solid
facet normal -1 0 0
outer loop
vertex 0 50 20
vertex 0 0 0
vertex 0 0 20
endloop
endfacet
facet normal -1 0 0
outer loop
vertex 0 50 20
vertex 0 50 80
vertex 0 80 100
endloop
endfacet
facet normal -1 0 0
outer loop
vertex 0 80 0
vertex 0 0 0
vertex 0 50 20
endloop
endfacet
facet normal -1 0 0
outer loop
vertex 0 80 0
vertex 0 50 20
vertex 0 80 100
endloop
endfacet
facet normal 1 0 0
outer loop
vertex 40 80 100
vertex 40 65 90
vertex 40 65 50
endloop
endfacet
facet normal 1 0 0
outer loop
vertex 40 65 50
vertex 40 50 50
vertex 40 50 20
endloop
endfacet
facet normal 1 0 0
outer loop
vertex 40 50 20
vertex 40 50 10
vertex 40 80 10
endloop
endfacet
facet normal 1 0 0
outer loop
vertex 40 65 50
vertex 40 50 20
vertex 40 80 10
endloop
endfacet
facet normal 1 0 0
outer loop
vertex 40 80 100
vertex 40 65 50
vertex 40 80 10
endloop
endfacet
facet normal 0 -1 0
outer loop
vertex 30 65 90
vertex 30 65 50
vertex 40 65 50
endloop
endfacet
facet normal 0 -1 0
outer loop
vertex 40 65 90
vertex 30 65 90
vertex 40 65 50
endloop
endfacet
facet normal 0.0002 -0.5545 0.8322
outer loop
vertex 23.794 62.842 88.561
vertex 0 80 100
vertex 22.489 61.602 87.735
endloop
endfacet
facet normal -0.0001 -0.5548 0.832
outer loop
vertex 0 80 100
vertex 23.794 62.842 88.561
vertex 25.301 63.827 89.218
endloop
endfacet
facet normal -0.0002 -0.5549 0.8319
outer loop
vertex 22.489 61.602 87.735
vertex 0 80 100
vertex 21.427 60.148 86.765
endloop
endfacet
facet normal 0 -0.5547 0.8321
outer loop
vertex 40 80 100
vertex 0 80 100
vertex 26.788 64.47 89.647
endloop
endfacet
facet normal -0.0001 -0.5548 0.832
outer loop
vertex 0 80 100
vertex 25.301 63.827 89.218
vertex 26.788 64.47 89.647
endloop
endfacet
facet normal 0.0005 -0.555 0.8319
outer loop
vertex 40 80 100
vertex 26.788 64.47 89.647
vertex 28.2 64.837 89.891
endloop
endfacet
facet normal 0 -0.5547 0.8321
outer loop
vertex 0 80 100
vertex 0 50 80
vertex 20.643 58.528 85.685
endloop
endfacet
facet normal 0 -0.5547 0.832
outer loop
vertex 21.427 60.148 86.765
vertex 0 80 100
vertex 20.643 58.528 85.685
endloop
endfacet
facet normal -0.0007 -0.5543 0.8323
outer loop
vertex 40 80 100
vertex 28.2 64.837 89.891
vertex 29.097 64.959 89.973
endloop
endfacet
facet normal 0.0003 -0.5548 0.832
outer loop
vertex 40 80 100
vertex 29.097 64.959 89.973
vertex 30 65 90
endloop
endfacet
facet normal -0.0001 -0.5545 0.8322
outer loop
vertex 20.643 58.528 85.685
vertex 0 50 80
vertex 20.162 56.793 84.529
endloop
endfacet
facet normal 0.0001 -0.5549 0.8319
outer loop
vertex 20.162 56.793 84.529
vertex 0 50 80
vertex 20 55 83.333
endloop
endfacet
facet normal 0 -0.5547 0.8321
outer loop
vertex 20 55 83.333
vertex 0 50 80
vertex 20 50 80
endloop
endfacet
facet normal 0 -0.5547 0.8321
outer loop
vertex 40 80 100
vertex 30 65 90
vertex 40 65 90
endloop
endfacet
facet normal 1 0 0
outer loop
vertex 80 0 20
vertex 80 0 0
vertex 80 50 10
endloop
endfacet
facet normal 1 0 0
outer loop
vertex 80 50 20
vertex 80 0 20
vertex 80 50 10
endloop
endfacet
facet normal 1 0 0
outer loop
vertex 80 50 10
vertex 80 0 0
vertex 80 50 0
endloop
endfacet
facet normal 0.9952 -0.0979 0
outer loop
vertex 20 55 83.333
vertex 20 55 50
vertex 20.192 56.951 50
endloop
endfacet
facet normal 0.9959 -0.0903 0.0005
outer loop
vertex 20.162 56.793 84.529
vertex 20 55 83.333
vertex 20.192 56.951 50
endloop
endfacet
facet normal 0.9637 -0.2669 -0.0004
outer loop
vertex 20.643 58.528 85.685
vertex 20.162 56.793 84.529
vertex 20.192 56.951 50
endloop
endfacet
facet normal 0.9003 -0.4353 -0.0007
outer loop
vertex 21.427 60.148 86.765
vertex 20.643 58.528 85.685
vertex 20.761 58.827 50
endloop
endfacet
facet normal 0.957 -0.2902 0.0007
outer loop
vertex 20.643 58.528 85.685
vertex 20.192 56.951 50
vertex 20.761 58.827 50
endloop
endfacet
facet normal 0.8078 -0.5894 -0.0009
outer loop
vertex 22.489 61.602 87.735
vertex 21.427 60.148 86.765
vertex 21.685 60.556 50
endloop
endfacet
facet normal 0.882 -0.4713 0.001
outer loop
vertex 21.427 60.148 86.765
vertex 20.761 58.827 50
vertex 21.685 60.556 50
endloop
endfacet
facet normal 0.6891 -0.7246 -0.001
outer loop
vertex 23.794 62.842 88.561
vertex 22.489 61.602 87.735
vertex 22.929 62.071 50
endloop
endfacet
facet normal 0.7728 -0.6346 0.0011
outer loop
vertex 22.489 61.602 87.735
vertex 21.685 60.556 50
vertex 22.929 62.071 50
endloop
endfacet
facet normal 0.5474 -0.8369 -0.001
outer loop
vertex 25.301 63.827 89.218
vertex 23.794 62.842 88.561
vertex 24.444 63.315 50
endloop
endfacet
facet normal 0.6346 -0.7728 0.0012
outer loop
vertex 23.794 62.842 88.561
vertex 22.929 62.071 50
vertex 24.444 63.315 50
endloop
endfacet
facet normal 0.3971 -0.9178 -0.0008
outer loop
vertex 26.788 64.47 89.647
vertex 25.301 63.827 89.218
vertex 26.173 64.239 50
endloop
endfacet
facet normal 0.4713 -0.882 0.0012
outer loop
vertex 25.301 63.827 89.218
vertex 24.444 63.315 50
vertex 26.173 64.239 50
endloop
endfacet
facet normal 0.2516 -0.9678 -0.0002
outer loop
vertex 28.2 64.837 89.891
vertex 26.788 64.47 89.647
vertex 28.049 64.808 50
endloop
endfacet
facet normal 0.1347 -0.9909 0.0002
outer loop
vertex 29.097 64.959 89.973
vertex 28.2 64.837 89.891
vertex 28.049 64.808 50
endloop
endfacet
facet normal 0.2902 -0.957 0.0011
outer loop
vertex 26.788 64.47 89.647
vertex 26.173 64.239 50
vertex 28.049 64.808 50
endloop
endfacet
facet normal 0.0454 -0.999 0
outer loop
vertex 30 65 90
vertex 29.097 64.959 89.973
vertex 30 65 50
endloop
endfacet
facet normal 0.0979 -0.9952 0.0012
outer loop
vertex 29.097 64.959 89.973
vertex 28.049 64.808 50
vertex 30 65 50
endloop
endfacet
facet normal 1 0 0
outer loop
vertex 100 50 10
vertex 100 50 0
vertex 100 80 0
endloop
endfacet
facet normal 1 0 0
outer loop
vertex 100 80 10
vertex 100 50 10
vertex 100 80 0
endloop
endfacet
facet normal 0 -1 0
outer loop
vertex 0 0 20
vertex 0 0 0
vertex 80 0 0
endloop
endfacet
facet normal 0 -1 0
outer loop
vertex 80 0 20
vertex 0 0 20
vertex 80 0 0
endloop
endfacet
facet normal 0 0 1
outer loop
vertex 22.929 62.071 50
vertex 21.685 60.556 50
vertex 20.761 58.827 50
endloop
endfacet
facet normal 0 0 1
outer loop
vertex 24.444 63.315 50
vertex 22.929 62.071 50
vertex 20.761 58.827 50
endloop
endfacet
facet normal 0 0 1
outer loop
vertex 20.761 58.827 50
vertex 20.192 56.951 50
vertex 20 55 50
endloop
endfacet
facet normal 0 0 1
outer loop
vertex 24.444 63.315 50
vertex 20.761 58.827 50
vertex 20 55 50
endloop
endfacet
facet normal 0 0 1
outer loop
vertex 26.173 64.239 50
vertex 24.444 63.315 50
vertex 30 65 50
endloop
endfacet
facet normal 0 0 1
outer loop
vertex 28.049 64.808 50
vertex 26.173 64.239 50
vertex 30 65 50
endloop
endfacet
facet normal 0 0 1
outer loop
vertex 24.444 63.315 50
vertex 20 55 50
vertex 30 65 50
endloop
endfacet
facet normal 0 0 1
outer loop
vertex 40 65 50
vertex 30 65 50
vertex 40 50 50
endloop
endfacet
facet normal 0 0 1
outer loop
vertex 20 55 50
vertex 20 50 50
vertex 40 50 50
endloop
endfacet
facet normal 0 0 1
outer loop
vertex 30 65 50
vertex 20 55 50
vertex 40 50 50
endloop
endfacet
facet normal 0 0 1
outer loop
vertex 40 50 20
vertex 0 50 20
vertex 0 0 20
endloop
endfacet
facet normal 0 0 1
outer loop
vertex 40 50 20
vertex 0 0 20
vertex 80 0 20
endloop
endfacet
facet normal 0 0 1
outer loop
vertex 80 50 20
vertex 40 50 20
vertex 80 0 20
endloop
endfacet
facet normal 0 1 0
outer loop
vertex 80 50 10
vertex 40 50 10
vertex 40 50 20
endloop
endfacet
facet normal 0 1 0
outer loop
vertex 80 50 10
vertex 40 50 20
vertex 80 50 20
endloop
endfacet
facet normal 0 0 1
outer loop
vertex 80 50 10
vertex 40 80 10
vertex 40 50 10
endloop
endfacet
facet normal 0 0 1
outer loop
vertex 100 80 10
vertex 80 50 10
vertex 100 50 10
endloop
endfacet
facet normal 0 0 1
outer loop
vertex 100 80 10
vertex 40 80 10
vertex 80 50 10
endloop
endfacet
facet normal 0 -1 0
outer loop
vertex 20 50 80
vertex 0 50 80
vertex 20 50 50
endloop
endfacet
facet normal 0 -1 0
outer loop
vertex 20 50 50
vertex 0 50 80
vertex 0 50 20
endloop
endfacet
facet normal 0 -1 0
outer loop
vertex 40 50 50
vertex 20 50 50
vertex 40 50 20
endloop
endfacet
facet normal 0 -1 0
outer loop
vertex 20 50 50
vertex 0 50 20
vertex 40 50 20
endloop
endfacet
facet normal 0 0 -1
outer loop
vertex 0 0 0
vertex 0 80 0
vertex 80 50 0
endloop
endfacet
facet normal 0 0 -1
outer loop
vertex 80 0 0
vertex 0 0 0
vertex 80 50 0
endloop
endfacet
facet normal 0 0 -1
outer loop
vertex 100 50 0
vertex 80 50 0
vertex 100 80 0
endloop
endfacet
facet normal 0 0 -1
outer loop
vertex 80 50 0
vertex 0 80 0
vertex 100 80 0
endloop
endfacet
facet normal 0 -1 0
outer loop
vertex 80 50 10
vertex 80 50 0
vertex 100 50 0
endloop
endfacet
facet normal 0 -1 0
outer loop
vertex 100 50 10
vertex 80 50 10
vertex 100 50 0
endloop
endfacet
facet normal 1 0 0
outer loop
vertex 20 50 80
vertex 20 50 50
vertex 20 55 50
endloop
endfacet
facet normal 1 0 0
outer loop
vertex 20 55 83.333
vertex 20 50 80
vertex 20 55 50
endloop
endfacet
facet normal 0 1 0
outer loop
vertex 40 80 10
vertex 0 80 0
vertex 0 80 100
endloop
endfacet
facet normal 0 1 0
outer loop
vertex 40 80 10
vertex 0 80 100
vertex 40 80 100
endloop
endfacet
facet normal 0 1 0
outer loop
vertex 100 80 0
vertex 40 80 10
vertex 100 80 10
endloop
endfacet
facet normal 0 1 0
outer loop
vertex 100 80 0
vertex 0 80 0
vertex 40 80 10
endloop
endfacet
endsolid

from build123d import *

# Parameters (mm, degrees)
F0_W     = 80
F0_H     = 50
F1_DEPTH = 20
F2_W     = 100
F2_H     = 30
F3_DEPTH = 10
F4_W     = 40
F4_H     = 30
F5_DEPTH = 90
F6_SIZE2 = 19.99999
F6_SIZE  = 29.99999
F9_DEPTH = 50.001


# Not quite as in the source:
# - a fillet or chamfer is up to 0.001 mm smaller than in the source, because OpenCascade refuses the exact size


with BuildPart() as f1:
    # F0 (on Top) → F1 (new body)
    with BuildSketch(Plane.XY):
        with Locations((40, 25)):
            Rectangle(F0_W, F0_H)
    extrude(amount=F1_DEPTH)

    # F2 (on Top) → F3 (join)
    with BuildSketch(Plane.XY):
        with Locations((50, 65)):
            Rectangle(F2_W, F2_H)
    extrude(amount=F3_DEPTH)

    # F4 (on face) → F5 (join)
    with BuildSketch(Plane.XY.offset(10)):
        with Locations((20, 65)):
            Rectangle(F4_W, F4_H)
    extrude(amount=F5_DEPTH)

    # F6 (size 30 and 20 in the source; OpenCascade refuses exactly that, so slightly less here)
    f6_edges = [f1.edges().sort_by_distance(p)[0] for p in [
        (20, 50, 100),
    ]]
    f6_side = f1.faces().sort_by_distance((20, 65, 100))[0]
    chamfer(f6_edges, length=F6_SIZE, length2=F6_SIZE2, reference=f6_side)

    # F8 (on offset) → F9 (cut, through all)
    with BuildSketch(Plane(origin=(0, 0, 50), x_dir=(1, 0, 0), z_dir=(0, 0, -1))):
        with BuildLine():
            Line((30, -65), (40, -65))
            Line((40, -65), (40, -50))
            Line((40, -50), (20, -50))
            Line((20, -50), (20, -55))
            ThreePointArc((20, -55), (22.9289321881, -62.0710678119), (30, -65))
        make_face()
    extrude(amount=-F9_DEPTH, mode=Mode.SUBTRACT)


solid = f1.part
